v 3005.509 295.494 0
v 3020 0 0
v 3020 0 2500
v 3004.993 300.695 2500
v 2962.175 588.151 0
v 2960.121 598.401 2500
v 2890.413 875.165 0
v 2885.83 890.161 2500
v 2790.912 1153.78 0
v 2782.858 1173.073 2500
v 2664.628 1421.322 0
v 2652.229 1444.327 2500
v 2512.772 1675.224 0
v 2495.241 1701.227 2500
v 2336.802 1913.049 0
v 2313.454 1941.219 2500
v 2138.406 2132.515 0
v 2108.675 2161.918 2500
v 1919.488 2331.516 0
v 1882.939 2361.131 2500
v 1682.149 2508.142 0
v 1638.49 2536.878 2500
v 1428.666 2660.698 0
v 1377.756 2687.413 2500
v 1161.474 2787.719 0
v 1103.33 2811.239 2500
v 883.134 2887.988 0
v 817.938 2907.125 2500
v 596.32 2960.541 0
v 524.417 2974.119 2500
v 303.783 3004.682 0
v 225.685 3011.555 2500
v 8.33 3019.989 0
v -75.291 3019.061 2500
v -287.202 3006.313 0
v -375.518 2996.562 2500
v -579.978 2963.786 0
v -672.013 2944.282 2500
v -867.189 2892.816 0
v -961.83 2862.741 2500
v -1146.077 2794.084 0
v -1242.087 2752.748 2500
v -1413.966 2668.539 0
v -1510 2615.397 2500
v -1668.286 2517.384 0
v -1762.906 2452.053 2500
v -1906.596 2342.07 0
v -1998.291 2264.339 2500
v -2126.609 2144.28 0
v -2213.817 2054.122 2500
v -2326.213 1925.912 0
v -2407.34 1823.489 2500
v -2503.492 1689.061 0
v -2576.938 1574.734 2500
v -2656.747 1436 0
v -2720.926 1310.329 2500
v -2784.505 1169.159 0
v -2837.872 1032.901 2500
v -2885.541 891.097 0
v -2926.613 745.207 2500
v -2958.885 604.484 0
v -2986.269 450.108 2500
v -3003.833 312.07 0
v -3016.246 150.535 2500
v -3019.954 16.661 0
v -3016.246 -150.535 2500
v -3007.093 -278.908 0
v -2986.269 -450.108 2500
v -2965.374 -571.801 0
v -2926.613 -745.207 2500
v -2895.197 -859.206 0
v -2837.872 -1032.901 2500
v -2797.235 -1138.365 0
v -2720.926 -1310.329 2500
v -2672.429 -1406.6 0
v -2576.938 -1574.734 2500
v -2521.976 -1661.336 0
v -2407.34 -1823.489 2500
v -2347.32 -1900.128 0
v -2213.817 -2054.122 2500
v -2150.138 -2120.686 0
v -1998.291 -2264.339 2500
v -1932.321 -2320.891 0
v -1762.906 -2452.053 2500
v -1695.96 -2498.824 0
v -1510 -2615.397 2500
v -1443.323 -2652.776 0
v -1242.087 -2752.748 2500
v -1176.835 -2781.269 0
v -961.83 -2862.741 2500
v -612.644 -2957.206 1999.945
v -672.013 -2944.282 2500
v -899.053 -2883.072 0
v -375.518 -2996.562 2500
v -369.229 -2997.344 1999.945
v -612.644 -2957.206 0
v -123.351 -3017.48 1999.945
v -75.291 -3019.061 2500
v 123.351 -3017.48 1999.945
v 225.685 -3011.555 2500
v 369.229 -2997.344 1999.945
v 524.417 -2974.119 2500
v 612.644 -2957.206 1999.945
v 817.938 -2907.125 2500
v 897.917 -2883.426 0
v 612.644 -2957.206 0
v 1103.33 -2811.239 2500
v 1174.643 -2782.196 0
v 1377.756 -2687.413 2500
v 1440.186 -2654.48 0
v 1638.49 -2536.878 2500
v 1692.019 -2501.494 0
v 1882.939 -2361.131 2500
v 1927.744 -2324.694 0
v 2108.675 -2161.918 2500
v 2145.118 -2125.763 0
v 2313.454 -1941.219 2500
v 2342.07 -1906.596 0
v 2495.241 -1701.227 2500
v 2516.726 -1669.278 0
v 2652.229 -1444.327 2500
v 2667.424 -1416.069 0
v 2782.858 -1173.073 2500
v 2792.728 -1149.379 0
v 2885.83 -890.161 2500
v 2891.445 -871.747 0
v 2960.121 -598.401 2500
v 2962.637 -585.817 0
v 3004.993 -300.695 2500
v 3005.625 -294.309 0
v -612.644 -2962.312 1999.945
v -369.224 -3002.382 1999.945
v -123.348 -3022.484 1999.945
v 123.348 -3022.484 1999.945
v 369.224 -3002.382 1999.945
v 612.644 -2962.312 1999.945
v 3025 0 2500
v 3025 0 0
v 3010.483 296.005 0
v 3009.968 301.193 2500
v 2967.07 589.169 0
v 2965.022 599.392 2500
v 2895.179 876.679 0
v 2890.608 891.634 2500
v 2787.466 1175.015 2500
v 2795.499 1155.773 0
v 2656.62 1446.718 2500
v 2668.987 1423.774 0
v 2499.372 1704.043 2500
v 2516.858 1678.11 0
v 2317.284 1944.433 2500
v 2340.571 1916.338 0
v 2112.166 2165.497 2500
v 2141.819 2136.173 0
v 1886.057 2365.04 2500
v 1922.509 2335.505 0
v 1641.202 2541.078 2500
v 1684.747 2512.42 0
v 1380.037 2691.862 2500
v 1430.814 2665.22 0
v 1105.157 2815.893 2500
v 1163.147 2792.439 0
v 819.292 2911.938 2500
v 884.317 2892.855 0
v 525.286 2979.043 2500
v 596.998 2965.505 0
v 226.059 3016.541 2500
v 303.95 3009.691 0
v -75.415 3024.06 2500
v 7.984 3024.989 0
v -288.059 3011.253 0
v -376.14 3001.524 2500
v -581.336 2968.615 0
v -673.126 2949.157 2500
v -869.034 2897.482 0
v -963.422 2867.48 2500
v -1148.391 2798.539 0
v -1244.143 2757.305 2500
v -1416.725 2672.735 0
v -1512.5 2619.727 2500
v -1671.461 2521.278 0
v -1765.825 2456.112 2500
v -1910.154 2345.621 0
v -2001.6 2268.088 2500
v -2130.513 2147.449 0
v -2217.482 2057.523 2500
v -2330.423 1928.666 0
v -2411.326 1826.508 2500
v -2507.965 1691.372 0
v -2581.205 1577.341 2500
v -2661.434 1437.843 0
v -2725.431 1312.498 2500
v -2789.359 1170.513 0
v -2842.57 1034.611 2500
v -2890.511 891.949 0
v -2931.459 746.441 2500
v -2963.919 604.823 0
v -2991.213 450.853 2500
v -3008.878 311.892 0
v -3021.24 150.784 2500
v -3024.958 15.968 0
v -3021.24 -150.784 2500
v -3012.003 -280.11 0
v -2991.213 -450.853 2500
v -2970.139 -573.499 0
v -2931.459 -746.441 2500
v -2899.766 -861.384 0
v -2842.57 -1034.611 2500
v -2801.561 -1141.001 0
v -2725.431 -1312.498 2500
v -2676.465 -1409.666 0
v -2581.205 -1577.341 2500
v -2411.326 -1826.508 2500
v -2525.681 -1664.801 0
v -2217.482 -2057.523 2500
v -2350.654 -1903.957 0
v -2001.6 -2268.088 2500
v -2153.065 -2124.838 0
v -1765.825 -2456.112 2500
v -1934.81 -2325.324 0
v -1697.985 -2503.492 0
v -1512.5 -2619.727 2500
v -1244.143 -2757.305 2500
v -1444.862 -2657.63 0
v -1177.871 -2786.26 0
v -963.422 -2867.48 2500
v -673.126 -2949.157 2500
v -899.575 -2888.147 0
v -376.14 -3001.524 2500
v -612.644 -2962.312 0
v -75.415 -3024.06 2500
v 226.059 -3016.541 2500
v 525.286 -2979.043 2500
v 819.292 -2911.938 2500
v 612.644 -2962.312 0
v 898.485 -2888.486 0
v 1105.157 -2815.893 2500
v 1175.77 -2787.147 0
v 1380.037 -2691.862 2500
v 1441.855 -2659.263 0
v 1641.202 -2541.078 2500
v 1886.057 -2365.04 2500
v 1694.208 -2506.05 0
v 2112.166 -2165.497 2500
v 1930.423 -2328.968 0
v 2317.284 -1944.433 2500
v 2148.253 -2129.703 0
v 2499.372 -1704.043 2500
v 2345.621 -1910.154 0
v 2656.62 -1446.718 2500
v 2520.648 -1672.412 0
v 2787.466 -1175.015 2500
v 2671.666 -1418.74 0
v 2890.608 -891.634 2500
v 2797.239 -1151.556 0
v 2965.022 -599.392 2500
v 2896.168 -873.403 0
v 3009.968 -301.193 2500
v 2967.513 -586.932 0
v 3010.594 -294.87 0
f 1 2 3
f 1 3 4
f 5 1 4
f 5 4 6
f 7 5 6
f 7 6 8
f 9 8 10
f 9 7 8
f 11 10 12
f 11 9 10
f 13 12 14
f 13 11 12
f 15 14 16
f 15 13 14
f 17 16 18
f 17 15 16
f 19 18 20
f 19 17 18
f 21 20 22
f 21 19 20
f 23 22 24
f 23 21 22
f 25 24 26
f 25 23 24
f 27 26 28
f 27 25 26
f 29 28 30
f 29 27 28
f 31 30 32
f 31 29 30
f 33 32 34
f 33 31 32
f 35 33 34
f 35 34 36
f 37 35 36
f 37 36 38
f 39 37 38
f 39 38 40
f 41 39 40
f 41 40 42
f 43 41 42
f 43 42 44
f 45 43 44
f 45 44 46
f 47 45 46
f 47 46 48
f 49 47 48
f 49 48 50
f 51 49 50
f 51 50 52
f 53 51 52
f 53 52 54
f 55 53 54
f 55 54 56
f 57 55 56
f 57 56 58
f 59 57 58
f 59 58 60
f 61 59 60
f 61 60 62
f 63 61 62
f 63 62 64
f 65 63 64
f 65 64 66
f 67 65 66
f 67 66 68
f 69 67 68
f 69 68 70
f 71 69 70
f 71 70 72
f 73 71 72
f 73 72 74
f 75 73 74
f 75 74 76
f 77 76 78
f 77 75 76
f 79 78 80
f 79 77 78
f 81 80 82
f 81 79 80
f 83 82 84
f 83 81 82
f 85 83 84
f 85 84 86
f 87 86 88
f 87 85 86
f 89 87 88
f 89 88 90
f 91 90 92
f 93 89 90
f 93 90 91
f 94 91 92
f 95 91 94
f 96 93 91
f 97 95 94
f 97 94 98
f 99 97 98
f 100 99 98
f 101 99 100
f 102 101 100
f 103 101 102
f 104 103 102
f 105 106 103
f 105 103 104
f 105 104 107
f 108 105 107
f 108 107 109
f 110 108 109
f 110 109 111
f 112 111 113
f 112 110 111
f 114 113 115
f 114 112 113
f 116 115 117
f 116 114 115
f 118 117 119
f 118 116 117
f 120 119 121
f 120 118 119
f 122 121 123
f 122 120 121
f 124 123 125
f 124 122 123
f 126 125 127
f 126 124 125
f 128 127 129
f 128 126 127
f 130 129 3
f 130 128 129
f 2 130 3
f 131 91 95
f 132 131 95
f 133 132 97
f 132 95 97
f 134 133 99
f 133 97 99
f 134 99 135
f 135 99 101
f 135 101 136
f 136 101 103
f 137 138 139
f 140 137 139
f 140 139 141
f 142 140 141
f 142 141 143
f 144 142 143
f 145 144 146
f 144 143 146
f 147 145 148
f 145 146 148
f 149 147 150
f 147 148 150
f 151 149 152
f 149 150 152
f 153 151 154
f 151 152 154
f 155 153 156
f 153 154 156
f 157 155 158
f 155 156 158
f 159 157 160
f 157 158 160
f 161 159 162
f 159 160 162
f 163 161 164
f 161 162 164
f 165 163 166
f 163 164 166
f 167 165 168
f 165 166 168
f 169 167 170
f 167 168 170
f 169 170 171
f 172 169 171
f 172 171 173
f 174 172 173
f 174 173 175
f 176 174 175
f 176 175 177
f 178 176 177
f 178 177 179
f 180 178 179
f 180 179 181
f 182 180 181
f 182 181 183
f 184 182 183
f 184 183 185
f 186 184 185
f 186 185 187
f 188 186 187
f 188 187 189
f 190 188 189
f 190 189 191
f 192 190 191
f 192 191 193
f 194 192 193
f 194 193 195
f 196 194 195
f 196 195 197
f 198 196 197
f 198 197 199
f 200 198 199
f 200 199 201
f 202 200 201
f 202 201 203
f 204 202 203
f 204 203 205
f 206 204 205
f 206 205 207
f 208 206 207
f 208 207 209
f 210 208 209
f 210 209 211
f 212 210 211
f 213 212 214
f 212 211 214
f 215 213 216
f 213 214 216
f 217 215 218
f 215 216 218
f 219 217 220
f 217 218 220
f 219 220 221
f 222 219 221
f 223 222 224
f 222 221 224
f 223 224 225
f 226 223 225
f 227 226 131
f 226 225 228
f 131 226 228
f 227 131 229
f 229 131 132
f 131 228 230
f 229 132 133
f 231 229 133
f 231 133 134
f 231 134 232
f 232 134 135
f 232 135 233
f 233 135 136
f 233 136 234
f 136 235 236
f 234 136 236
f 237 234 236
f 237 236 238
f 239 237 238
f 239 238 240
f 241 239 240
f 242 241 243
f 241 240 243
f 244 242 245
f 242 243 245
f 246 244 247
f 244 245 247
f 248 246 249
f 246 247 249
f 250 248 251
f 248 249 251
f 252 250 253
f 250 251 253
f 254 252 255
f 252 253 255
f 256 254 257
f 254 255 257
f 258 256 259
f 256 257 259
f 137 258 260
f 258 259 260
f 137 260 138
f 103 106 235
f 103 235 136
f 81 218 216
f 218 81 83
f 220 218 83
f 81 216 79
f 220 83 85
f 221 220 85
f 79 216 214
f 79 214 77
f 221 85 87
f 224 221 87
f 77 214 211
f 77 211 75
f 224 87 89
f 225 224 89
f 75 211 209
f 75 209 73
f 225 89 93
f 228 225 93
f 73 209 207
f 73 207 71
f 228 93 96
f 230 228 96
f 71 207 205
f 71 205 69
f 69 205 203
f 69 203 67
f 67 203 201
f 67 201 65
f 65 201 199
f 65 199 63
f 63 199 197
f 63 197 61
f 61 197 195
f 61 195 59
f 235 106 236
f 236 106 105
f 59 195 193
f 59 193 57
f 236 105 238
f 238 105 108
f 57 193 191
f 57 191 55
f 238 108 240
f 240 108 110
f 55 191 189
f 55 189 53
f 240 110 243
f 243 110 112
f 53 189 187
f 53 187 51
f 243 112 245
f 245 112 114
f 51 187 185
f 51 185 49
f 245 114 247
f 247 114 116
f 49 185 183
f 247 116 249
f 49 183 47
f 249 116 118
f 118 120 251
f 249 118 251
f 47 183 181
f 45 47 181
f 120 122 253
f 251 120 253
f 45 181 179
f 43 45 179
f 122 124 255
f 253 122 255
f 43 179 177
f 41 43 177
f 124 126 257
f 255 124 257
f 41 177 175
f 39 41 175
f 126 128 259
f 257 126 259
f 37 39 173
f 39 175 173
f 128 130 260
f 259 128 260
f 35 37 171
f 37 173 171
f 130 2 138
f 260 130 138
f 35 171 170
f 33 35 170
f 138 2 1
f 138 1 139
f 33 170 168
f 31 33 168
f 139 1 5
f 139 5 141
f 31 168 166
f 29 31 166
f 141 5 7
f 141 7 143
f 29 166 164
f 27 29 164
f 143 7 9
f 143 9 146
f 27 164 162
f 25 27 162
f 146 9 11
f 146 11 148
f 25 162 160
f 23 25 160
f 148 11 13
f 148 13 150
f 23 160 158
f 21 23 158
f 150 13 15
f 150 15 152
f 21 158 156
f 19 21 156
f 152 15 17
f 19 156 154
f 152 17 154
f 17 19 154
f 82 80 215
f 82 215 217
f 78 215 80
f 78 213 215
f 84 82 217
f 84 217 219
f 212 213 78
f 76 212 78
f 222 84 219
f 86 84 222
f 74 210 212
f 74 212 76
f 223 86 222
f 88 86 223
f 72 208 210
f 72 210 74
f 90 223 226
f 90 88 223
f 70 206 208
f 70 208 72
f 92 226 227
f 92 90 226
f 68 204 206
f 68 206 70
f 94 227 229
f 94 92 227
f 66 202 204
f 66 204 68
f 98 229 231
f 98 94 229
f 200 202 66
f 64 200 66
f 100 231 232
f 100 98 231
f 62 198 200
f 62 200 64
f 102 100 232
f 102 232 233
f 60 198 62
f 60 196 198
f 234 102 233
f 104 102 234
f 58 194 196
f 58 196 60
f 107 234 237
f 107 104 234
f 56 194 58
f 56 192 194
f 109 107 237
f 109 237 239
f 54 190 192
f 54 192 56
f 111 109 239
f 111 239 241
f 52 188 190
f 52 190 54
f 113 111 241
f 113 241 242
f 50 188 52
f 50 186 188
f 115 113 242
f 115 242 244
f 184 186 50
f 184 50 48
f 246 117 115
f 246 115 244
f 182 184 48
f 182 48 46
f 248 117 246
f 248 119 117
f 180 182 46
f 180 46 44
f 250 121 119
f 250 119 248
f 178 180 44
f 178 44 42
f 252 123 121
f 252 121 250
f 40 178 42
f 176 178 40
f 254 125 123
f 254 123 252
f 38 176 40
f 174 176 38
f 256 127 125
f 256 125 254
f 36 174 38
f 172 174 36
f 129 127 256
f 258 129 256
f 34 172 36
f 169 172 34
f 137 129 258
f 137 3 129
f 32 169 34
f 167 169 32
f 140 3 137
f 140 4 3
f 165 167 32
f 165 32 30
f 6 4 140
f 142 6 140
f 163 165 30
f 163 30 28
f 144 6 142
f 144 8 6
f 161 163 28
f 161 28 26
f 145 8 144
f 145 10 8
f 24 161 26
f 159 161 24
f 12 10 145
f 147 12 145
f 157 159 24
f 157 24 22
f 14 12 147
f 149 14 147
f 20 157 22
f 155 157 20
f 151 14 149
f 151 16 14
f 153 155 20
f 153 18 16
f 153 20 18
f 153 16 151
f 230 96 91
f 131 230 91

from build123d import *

# Parameters (mm, degrees)
F0_R     = 3025
F0_R_2   = 3020
F1_DEPTH = 2500
F2_W     = 1225.2871990204
F2_H     = 1999.9452829361
F3_DEPTH = 3026


with BuildPart() as f1:
    # F0 (on Top) → F1 (new body)
    with BuildSketch(Plane.XY):
        Circle(F0_R)
        Circle(F0_R_2, mode=Mode.SUBTRACT)
    extrude(amount=F1_DEPTH)

    # F2 (on Front) → F3 (cut, up to face)
    with BuildSketch(Plane.XZ):
        with Locations((0, 999.972641468)):
            Rectangle(F2_W, F2_H)
    extrude(amount=F3_DEPTH, mode=Mode.SUBTRACT)


solid = f1.part
